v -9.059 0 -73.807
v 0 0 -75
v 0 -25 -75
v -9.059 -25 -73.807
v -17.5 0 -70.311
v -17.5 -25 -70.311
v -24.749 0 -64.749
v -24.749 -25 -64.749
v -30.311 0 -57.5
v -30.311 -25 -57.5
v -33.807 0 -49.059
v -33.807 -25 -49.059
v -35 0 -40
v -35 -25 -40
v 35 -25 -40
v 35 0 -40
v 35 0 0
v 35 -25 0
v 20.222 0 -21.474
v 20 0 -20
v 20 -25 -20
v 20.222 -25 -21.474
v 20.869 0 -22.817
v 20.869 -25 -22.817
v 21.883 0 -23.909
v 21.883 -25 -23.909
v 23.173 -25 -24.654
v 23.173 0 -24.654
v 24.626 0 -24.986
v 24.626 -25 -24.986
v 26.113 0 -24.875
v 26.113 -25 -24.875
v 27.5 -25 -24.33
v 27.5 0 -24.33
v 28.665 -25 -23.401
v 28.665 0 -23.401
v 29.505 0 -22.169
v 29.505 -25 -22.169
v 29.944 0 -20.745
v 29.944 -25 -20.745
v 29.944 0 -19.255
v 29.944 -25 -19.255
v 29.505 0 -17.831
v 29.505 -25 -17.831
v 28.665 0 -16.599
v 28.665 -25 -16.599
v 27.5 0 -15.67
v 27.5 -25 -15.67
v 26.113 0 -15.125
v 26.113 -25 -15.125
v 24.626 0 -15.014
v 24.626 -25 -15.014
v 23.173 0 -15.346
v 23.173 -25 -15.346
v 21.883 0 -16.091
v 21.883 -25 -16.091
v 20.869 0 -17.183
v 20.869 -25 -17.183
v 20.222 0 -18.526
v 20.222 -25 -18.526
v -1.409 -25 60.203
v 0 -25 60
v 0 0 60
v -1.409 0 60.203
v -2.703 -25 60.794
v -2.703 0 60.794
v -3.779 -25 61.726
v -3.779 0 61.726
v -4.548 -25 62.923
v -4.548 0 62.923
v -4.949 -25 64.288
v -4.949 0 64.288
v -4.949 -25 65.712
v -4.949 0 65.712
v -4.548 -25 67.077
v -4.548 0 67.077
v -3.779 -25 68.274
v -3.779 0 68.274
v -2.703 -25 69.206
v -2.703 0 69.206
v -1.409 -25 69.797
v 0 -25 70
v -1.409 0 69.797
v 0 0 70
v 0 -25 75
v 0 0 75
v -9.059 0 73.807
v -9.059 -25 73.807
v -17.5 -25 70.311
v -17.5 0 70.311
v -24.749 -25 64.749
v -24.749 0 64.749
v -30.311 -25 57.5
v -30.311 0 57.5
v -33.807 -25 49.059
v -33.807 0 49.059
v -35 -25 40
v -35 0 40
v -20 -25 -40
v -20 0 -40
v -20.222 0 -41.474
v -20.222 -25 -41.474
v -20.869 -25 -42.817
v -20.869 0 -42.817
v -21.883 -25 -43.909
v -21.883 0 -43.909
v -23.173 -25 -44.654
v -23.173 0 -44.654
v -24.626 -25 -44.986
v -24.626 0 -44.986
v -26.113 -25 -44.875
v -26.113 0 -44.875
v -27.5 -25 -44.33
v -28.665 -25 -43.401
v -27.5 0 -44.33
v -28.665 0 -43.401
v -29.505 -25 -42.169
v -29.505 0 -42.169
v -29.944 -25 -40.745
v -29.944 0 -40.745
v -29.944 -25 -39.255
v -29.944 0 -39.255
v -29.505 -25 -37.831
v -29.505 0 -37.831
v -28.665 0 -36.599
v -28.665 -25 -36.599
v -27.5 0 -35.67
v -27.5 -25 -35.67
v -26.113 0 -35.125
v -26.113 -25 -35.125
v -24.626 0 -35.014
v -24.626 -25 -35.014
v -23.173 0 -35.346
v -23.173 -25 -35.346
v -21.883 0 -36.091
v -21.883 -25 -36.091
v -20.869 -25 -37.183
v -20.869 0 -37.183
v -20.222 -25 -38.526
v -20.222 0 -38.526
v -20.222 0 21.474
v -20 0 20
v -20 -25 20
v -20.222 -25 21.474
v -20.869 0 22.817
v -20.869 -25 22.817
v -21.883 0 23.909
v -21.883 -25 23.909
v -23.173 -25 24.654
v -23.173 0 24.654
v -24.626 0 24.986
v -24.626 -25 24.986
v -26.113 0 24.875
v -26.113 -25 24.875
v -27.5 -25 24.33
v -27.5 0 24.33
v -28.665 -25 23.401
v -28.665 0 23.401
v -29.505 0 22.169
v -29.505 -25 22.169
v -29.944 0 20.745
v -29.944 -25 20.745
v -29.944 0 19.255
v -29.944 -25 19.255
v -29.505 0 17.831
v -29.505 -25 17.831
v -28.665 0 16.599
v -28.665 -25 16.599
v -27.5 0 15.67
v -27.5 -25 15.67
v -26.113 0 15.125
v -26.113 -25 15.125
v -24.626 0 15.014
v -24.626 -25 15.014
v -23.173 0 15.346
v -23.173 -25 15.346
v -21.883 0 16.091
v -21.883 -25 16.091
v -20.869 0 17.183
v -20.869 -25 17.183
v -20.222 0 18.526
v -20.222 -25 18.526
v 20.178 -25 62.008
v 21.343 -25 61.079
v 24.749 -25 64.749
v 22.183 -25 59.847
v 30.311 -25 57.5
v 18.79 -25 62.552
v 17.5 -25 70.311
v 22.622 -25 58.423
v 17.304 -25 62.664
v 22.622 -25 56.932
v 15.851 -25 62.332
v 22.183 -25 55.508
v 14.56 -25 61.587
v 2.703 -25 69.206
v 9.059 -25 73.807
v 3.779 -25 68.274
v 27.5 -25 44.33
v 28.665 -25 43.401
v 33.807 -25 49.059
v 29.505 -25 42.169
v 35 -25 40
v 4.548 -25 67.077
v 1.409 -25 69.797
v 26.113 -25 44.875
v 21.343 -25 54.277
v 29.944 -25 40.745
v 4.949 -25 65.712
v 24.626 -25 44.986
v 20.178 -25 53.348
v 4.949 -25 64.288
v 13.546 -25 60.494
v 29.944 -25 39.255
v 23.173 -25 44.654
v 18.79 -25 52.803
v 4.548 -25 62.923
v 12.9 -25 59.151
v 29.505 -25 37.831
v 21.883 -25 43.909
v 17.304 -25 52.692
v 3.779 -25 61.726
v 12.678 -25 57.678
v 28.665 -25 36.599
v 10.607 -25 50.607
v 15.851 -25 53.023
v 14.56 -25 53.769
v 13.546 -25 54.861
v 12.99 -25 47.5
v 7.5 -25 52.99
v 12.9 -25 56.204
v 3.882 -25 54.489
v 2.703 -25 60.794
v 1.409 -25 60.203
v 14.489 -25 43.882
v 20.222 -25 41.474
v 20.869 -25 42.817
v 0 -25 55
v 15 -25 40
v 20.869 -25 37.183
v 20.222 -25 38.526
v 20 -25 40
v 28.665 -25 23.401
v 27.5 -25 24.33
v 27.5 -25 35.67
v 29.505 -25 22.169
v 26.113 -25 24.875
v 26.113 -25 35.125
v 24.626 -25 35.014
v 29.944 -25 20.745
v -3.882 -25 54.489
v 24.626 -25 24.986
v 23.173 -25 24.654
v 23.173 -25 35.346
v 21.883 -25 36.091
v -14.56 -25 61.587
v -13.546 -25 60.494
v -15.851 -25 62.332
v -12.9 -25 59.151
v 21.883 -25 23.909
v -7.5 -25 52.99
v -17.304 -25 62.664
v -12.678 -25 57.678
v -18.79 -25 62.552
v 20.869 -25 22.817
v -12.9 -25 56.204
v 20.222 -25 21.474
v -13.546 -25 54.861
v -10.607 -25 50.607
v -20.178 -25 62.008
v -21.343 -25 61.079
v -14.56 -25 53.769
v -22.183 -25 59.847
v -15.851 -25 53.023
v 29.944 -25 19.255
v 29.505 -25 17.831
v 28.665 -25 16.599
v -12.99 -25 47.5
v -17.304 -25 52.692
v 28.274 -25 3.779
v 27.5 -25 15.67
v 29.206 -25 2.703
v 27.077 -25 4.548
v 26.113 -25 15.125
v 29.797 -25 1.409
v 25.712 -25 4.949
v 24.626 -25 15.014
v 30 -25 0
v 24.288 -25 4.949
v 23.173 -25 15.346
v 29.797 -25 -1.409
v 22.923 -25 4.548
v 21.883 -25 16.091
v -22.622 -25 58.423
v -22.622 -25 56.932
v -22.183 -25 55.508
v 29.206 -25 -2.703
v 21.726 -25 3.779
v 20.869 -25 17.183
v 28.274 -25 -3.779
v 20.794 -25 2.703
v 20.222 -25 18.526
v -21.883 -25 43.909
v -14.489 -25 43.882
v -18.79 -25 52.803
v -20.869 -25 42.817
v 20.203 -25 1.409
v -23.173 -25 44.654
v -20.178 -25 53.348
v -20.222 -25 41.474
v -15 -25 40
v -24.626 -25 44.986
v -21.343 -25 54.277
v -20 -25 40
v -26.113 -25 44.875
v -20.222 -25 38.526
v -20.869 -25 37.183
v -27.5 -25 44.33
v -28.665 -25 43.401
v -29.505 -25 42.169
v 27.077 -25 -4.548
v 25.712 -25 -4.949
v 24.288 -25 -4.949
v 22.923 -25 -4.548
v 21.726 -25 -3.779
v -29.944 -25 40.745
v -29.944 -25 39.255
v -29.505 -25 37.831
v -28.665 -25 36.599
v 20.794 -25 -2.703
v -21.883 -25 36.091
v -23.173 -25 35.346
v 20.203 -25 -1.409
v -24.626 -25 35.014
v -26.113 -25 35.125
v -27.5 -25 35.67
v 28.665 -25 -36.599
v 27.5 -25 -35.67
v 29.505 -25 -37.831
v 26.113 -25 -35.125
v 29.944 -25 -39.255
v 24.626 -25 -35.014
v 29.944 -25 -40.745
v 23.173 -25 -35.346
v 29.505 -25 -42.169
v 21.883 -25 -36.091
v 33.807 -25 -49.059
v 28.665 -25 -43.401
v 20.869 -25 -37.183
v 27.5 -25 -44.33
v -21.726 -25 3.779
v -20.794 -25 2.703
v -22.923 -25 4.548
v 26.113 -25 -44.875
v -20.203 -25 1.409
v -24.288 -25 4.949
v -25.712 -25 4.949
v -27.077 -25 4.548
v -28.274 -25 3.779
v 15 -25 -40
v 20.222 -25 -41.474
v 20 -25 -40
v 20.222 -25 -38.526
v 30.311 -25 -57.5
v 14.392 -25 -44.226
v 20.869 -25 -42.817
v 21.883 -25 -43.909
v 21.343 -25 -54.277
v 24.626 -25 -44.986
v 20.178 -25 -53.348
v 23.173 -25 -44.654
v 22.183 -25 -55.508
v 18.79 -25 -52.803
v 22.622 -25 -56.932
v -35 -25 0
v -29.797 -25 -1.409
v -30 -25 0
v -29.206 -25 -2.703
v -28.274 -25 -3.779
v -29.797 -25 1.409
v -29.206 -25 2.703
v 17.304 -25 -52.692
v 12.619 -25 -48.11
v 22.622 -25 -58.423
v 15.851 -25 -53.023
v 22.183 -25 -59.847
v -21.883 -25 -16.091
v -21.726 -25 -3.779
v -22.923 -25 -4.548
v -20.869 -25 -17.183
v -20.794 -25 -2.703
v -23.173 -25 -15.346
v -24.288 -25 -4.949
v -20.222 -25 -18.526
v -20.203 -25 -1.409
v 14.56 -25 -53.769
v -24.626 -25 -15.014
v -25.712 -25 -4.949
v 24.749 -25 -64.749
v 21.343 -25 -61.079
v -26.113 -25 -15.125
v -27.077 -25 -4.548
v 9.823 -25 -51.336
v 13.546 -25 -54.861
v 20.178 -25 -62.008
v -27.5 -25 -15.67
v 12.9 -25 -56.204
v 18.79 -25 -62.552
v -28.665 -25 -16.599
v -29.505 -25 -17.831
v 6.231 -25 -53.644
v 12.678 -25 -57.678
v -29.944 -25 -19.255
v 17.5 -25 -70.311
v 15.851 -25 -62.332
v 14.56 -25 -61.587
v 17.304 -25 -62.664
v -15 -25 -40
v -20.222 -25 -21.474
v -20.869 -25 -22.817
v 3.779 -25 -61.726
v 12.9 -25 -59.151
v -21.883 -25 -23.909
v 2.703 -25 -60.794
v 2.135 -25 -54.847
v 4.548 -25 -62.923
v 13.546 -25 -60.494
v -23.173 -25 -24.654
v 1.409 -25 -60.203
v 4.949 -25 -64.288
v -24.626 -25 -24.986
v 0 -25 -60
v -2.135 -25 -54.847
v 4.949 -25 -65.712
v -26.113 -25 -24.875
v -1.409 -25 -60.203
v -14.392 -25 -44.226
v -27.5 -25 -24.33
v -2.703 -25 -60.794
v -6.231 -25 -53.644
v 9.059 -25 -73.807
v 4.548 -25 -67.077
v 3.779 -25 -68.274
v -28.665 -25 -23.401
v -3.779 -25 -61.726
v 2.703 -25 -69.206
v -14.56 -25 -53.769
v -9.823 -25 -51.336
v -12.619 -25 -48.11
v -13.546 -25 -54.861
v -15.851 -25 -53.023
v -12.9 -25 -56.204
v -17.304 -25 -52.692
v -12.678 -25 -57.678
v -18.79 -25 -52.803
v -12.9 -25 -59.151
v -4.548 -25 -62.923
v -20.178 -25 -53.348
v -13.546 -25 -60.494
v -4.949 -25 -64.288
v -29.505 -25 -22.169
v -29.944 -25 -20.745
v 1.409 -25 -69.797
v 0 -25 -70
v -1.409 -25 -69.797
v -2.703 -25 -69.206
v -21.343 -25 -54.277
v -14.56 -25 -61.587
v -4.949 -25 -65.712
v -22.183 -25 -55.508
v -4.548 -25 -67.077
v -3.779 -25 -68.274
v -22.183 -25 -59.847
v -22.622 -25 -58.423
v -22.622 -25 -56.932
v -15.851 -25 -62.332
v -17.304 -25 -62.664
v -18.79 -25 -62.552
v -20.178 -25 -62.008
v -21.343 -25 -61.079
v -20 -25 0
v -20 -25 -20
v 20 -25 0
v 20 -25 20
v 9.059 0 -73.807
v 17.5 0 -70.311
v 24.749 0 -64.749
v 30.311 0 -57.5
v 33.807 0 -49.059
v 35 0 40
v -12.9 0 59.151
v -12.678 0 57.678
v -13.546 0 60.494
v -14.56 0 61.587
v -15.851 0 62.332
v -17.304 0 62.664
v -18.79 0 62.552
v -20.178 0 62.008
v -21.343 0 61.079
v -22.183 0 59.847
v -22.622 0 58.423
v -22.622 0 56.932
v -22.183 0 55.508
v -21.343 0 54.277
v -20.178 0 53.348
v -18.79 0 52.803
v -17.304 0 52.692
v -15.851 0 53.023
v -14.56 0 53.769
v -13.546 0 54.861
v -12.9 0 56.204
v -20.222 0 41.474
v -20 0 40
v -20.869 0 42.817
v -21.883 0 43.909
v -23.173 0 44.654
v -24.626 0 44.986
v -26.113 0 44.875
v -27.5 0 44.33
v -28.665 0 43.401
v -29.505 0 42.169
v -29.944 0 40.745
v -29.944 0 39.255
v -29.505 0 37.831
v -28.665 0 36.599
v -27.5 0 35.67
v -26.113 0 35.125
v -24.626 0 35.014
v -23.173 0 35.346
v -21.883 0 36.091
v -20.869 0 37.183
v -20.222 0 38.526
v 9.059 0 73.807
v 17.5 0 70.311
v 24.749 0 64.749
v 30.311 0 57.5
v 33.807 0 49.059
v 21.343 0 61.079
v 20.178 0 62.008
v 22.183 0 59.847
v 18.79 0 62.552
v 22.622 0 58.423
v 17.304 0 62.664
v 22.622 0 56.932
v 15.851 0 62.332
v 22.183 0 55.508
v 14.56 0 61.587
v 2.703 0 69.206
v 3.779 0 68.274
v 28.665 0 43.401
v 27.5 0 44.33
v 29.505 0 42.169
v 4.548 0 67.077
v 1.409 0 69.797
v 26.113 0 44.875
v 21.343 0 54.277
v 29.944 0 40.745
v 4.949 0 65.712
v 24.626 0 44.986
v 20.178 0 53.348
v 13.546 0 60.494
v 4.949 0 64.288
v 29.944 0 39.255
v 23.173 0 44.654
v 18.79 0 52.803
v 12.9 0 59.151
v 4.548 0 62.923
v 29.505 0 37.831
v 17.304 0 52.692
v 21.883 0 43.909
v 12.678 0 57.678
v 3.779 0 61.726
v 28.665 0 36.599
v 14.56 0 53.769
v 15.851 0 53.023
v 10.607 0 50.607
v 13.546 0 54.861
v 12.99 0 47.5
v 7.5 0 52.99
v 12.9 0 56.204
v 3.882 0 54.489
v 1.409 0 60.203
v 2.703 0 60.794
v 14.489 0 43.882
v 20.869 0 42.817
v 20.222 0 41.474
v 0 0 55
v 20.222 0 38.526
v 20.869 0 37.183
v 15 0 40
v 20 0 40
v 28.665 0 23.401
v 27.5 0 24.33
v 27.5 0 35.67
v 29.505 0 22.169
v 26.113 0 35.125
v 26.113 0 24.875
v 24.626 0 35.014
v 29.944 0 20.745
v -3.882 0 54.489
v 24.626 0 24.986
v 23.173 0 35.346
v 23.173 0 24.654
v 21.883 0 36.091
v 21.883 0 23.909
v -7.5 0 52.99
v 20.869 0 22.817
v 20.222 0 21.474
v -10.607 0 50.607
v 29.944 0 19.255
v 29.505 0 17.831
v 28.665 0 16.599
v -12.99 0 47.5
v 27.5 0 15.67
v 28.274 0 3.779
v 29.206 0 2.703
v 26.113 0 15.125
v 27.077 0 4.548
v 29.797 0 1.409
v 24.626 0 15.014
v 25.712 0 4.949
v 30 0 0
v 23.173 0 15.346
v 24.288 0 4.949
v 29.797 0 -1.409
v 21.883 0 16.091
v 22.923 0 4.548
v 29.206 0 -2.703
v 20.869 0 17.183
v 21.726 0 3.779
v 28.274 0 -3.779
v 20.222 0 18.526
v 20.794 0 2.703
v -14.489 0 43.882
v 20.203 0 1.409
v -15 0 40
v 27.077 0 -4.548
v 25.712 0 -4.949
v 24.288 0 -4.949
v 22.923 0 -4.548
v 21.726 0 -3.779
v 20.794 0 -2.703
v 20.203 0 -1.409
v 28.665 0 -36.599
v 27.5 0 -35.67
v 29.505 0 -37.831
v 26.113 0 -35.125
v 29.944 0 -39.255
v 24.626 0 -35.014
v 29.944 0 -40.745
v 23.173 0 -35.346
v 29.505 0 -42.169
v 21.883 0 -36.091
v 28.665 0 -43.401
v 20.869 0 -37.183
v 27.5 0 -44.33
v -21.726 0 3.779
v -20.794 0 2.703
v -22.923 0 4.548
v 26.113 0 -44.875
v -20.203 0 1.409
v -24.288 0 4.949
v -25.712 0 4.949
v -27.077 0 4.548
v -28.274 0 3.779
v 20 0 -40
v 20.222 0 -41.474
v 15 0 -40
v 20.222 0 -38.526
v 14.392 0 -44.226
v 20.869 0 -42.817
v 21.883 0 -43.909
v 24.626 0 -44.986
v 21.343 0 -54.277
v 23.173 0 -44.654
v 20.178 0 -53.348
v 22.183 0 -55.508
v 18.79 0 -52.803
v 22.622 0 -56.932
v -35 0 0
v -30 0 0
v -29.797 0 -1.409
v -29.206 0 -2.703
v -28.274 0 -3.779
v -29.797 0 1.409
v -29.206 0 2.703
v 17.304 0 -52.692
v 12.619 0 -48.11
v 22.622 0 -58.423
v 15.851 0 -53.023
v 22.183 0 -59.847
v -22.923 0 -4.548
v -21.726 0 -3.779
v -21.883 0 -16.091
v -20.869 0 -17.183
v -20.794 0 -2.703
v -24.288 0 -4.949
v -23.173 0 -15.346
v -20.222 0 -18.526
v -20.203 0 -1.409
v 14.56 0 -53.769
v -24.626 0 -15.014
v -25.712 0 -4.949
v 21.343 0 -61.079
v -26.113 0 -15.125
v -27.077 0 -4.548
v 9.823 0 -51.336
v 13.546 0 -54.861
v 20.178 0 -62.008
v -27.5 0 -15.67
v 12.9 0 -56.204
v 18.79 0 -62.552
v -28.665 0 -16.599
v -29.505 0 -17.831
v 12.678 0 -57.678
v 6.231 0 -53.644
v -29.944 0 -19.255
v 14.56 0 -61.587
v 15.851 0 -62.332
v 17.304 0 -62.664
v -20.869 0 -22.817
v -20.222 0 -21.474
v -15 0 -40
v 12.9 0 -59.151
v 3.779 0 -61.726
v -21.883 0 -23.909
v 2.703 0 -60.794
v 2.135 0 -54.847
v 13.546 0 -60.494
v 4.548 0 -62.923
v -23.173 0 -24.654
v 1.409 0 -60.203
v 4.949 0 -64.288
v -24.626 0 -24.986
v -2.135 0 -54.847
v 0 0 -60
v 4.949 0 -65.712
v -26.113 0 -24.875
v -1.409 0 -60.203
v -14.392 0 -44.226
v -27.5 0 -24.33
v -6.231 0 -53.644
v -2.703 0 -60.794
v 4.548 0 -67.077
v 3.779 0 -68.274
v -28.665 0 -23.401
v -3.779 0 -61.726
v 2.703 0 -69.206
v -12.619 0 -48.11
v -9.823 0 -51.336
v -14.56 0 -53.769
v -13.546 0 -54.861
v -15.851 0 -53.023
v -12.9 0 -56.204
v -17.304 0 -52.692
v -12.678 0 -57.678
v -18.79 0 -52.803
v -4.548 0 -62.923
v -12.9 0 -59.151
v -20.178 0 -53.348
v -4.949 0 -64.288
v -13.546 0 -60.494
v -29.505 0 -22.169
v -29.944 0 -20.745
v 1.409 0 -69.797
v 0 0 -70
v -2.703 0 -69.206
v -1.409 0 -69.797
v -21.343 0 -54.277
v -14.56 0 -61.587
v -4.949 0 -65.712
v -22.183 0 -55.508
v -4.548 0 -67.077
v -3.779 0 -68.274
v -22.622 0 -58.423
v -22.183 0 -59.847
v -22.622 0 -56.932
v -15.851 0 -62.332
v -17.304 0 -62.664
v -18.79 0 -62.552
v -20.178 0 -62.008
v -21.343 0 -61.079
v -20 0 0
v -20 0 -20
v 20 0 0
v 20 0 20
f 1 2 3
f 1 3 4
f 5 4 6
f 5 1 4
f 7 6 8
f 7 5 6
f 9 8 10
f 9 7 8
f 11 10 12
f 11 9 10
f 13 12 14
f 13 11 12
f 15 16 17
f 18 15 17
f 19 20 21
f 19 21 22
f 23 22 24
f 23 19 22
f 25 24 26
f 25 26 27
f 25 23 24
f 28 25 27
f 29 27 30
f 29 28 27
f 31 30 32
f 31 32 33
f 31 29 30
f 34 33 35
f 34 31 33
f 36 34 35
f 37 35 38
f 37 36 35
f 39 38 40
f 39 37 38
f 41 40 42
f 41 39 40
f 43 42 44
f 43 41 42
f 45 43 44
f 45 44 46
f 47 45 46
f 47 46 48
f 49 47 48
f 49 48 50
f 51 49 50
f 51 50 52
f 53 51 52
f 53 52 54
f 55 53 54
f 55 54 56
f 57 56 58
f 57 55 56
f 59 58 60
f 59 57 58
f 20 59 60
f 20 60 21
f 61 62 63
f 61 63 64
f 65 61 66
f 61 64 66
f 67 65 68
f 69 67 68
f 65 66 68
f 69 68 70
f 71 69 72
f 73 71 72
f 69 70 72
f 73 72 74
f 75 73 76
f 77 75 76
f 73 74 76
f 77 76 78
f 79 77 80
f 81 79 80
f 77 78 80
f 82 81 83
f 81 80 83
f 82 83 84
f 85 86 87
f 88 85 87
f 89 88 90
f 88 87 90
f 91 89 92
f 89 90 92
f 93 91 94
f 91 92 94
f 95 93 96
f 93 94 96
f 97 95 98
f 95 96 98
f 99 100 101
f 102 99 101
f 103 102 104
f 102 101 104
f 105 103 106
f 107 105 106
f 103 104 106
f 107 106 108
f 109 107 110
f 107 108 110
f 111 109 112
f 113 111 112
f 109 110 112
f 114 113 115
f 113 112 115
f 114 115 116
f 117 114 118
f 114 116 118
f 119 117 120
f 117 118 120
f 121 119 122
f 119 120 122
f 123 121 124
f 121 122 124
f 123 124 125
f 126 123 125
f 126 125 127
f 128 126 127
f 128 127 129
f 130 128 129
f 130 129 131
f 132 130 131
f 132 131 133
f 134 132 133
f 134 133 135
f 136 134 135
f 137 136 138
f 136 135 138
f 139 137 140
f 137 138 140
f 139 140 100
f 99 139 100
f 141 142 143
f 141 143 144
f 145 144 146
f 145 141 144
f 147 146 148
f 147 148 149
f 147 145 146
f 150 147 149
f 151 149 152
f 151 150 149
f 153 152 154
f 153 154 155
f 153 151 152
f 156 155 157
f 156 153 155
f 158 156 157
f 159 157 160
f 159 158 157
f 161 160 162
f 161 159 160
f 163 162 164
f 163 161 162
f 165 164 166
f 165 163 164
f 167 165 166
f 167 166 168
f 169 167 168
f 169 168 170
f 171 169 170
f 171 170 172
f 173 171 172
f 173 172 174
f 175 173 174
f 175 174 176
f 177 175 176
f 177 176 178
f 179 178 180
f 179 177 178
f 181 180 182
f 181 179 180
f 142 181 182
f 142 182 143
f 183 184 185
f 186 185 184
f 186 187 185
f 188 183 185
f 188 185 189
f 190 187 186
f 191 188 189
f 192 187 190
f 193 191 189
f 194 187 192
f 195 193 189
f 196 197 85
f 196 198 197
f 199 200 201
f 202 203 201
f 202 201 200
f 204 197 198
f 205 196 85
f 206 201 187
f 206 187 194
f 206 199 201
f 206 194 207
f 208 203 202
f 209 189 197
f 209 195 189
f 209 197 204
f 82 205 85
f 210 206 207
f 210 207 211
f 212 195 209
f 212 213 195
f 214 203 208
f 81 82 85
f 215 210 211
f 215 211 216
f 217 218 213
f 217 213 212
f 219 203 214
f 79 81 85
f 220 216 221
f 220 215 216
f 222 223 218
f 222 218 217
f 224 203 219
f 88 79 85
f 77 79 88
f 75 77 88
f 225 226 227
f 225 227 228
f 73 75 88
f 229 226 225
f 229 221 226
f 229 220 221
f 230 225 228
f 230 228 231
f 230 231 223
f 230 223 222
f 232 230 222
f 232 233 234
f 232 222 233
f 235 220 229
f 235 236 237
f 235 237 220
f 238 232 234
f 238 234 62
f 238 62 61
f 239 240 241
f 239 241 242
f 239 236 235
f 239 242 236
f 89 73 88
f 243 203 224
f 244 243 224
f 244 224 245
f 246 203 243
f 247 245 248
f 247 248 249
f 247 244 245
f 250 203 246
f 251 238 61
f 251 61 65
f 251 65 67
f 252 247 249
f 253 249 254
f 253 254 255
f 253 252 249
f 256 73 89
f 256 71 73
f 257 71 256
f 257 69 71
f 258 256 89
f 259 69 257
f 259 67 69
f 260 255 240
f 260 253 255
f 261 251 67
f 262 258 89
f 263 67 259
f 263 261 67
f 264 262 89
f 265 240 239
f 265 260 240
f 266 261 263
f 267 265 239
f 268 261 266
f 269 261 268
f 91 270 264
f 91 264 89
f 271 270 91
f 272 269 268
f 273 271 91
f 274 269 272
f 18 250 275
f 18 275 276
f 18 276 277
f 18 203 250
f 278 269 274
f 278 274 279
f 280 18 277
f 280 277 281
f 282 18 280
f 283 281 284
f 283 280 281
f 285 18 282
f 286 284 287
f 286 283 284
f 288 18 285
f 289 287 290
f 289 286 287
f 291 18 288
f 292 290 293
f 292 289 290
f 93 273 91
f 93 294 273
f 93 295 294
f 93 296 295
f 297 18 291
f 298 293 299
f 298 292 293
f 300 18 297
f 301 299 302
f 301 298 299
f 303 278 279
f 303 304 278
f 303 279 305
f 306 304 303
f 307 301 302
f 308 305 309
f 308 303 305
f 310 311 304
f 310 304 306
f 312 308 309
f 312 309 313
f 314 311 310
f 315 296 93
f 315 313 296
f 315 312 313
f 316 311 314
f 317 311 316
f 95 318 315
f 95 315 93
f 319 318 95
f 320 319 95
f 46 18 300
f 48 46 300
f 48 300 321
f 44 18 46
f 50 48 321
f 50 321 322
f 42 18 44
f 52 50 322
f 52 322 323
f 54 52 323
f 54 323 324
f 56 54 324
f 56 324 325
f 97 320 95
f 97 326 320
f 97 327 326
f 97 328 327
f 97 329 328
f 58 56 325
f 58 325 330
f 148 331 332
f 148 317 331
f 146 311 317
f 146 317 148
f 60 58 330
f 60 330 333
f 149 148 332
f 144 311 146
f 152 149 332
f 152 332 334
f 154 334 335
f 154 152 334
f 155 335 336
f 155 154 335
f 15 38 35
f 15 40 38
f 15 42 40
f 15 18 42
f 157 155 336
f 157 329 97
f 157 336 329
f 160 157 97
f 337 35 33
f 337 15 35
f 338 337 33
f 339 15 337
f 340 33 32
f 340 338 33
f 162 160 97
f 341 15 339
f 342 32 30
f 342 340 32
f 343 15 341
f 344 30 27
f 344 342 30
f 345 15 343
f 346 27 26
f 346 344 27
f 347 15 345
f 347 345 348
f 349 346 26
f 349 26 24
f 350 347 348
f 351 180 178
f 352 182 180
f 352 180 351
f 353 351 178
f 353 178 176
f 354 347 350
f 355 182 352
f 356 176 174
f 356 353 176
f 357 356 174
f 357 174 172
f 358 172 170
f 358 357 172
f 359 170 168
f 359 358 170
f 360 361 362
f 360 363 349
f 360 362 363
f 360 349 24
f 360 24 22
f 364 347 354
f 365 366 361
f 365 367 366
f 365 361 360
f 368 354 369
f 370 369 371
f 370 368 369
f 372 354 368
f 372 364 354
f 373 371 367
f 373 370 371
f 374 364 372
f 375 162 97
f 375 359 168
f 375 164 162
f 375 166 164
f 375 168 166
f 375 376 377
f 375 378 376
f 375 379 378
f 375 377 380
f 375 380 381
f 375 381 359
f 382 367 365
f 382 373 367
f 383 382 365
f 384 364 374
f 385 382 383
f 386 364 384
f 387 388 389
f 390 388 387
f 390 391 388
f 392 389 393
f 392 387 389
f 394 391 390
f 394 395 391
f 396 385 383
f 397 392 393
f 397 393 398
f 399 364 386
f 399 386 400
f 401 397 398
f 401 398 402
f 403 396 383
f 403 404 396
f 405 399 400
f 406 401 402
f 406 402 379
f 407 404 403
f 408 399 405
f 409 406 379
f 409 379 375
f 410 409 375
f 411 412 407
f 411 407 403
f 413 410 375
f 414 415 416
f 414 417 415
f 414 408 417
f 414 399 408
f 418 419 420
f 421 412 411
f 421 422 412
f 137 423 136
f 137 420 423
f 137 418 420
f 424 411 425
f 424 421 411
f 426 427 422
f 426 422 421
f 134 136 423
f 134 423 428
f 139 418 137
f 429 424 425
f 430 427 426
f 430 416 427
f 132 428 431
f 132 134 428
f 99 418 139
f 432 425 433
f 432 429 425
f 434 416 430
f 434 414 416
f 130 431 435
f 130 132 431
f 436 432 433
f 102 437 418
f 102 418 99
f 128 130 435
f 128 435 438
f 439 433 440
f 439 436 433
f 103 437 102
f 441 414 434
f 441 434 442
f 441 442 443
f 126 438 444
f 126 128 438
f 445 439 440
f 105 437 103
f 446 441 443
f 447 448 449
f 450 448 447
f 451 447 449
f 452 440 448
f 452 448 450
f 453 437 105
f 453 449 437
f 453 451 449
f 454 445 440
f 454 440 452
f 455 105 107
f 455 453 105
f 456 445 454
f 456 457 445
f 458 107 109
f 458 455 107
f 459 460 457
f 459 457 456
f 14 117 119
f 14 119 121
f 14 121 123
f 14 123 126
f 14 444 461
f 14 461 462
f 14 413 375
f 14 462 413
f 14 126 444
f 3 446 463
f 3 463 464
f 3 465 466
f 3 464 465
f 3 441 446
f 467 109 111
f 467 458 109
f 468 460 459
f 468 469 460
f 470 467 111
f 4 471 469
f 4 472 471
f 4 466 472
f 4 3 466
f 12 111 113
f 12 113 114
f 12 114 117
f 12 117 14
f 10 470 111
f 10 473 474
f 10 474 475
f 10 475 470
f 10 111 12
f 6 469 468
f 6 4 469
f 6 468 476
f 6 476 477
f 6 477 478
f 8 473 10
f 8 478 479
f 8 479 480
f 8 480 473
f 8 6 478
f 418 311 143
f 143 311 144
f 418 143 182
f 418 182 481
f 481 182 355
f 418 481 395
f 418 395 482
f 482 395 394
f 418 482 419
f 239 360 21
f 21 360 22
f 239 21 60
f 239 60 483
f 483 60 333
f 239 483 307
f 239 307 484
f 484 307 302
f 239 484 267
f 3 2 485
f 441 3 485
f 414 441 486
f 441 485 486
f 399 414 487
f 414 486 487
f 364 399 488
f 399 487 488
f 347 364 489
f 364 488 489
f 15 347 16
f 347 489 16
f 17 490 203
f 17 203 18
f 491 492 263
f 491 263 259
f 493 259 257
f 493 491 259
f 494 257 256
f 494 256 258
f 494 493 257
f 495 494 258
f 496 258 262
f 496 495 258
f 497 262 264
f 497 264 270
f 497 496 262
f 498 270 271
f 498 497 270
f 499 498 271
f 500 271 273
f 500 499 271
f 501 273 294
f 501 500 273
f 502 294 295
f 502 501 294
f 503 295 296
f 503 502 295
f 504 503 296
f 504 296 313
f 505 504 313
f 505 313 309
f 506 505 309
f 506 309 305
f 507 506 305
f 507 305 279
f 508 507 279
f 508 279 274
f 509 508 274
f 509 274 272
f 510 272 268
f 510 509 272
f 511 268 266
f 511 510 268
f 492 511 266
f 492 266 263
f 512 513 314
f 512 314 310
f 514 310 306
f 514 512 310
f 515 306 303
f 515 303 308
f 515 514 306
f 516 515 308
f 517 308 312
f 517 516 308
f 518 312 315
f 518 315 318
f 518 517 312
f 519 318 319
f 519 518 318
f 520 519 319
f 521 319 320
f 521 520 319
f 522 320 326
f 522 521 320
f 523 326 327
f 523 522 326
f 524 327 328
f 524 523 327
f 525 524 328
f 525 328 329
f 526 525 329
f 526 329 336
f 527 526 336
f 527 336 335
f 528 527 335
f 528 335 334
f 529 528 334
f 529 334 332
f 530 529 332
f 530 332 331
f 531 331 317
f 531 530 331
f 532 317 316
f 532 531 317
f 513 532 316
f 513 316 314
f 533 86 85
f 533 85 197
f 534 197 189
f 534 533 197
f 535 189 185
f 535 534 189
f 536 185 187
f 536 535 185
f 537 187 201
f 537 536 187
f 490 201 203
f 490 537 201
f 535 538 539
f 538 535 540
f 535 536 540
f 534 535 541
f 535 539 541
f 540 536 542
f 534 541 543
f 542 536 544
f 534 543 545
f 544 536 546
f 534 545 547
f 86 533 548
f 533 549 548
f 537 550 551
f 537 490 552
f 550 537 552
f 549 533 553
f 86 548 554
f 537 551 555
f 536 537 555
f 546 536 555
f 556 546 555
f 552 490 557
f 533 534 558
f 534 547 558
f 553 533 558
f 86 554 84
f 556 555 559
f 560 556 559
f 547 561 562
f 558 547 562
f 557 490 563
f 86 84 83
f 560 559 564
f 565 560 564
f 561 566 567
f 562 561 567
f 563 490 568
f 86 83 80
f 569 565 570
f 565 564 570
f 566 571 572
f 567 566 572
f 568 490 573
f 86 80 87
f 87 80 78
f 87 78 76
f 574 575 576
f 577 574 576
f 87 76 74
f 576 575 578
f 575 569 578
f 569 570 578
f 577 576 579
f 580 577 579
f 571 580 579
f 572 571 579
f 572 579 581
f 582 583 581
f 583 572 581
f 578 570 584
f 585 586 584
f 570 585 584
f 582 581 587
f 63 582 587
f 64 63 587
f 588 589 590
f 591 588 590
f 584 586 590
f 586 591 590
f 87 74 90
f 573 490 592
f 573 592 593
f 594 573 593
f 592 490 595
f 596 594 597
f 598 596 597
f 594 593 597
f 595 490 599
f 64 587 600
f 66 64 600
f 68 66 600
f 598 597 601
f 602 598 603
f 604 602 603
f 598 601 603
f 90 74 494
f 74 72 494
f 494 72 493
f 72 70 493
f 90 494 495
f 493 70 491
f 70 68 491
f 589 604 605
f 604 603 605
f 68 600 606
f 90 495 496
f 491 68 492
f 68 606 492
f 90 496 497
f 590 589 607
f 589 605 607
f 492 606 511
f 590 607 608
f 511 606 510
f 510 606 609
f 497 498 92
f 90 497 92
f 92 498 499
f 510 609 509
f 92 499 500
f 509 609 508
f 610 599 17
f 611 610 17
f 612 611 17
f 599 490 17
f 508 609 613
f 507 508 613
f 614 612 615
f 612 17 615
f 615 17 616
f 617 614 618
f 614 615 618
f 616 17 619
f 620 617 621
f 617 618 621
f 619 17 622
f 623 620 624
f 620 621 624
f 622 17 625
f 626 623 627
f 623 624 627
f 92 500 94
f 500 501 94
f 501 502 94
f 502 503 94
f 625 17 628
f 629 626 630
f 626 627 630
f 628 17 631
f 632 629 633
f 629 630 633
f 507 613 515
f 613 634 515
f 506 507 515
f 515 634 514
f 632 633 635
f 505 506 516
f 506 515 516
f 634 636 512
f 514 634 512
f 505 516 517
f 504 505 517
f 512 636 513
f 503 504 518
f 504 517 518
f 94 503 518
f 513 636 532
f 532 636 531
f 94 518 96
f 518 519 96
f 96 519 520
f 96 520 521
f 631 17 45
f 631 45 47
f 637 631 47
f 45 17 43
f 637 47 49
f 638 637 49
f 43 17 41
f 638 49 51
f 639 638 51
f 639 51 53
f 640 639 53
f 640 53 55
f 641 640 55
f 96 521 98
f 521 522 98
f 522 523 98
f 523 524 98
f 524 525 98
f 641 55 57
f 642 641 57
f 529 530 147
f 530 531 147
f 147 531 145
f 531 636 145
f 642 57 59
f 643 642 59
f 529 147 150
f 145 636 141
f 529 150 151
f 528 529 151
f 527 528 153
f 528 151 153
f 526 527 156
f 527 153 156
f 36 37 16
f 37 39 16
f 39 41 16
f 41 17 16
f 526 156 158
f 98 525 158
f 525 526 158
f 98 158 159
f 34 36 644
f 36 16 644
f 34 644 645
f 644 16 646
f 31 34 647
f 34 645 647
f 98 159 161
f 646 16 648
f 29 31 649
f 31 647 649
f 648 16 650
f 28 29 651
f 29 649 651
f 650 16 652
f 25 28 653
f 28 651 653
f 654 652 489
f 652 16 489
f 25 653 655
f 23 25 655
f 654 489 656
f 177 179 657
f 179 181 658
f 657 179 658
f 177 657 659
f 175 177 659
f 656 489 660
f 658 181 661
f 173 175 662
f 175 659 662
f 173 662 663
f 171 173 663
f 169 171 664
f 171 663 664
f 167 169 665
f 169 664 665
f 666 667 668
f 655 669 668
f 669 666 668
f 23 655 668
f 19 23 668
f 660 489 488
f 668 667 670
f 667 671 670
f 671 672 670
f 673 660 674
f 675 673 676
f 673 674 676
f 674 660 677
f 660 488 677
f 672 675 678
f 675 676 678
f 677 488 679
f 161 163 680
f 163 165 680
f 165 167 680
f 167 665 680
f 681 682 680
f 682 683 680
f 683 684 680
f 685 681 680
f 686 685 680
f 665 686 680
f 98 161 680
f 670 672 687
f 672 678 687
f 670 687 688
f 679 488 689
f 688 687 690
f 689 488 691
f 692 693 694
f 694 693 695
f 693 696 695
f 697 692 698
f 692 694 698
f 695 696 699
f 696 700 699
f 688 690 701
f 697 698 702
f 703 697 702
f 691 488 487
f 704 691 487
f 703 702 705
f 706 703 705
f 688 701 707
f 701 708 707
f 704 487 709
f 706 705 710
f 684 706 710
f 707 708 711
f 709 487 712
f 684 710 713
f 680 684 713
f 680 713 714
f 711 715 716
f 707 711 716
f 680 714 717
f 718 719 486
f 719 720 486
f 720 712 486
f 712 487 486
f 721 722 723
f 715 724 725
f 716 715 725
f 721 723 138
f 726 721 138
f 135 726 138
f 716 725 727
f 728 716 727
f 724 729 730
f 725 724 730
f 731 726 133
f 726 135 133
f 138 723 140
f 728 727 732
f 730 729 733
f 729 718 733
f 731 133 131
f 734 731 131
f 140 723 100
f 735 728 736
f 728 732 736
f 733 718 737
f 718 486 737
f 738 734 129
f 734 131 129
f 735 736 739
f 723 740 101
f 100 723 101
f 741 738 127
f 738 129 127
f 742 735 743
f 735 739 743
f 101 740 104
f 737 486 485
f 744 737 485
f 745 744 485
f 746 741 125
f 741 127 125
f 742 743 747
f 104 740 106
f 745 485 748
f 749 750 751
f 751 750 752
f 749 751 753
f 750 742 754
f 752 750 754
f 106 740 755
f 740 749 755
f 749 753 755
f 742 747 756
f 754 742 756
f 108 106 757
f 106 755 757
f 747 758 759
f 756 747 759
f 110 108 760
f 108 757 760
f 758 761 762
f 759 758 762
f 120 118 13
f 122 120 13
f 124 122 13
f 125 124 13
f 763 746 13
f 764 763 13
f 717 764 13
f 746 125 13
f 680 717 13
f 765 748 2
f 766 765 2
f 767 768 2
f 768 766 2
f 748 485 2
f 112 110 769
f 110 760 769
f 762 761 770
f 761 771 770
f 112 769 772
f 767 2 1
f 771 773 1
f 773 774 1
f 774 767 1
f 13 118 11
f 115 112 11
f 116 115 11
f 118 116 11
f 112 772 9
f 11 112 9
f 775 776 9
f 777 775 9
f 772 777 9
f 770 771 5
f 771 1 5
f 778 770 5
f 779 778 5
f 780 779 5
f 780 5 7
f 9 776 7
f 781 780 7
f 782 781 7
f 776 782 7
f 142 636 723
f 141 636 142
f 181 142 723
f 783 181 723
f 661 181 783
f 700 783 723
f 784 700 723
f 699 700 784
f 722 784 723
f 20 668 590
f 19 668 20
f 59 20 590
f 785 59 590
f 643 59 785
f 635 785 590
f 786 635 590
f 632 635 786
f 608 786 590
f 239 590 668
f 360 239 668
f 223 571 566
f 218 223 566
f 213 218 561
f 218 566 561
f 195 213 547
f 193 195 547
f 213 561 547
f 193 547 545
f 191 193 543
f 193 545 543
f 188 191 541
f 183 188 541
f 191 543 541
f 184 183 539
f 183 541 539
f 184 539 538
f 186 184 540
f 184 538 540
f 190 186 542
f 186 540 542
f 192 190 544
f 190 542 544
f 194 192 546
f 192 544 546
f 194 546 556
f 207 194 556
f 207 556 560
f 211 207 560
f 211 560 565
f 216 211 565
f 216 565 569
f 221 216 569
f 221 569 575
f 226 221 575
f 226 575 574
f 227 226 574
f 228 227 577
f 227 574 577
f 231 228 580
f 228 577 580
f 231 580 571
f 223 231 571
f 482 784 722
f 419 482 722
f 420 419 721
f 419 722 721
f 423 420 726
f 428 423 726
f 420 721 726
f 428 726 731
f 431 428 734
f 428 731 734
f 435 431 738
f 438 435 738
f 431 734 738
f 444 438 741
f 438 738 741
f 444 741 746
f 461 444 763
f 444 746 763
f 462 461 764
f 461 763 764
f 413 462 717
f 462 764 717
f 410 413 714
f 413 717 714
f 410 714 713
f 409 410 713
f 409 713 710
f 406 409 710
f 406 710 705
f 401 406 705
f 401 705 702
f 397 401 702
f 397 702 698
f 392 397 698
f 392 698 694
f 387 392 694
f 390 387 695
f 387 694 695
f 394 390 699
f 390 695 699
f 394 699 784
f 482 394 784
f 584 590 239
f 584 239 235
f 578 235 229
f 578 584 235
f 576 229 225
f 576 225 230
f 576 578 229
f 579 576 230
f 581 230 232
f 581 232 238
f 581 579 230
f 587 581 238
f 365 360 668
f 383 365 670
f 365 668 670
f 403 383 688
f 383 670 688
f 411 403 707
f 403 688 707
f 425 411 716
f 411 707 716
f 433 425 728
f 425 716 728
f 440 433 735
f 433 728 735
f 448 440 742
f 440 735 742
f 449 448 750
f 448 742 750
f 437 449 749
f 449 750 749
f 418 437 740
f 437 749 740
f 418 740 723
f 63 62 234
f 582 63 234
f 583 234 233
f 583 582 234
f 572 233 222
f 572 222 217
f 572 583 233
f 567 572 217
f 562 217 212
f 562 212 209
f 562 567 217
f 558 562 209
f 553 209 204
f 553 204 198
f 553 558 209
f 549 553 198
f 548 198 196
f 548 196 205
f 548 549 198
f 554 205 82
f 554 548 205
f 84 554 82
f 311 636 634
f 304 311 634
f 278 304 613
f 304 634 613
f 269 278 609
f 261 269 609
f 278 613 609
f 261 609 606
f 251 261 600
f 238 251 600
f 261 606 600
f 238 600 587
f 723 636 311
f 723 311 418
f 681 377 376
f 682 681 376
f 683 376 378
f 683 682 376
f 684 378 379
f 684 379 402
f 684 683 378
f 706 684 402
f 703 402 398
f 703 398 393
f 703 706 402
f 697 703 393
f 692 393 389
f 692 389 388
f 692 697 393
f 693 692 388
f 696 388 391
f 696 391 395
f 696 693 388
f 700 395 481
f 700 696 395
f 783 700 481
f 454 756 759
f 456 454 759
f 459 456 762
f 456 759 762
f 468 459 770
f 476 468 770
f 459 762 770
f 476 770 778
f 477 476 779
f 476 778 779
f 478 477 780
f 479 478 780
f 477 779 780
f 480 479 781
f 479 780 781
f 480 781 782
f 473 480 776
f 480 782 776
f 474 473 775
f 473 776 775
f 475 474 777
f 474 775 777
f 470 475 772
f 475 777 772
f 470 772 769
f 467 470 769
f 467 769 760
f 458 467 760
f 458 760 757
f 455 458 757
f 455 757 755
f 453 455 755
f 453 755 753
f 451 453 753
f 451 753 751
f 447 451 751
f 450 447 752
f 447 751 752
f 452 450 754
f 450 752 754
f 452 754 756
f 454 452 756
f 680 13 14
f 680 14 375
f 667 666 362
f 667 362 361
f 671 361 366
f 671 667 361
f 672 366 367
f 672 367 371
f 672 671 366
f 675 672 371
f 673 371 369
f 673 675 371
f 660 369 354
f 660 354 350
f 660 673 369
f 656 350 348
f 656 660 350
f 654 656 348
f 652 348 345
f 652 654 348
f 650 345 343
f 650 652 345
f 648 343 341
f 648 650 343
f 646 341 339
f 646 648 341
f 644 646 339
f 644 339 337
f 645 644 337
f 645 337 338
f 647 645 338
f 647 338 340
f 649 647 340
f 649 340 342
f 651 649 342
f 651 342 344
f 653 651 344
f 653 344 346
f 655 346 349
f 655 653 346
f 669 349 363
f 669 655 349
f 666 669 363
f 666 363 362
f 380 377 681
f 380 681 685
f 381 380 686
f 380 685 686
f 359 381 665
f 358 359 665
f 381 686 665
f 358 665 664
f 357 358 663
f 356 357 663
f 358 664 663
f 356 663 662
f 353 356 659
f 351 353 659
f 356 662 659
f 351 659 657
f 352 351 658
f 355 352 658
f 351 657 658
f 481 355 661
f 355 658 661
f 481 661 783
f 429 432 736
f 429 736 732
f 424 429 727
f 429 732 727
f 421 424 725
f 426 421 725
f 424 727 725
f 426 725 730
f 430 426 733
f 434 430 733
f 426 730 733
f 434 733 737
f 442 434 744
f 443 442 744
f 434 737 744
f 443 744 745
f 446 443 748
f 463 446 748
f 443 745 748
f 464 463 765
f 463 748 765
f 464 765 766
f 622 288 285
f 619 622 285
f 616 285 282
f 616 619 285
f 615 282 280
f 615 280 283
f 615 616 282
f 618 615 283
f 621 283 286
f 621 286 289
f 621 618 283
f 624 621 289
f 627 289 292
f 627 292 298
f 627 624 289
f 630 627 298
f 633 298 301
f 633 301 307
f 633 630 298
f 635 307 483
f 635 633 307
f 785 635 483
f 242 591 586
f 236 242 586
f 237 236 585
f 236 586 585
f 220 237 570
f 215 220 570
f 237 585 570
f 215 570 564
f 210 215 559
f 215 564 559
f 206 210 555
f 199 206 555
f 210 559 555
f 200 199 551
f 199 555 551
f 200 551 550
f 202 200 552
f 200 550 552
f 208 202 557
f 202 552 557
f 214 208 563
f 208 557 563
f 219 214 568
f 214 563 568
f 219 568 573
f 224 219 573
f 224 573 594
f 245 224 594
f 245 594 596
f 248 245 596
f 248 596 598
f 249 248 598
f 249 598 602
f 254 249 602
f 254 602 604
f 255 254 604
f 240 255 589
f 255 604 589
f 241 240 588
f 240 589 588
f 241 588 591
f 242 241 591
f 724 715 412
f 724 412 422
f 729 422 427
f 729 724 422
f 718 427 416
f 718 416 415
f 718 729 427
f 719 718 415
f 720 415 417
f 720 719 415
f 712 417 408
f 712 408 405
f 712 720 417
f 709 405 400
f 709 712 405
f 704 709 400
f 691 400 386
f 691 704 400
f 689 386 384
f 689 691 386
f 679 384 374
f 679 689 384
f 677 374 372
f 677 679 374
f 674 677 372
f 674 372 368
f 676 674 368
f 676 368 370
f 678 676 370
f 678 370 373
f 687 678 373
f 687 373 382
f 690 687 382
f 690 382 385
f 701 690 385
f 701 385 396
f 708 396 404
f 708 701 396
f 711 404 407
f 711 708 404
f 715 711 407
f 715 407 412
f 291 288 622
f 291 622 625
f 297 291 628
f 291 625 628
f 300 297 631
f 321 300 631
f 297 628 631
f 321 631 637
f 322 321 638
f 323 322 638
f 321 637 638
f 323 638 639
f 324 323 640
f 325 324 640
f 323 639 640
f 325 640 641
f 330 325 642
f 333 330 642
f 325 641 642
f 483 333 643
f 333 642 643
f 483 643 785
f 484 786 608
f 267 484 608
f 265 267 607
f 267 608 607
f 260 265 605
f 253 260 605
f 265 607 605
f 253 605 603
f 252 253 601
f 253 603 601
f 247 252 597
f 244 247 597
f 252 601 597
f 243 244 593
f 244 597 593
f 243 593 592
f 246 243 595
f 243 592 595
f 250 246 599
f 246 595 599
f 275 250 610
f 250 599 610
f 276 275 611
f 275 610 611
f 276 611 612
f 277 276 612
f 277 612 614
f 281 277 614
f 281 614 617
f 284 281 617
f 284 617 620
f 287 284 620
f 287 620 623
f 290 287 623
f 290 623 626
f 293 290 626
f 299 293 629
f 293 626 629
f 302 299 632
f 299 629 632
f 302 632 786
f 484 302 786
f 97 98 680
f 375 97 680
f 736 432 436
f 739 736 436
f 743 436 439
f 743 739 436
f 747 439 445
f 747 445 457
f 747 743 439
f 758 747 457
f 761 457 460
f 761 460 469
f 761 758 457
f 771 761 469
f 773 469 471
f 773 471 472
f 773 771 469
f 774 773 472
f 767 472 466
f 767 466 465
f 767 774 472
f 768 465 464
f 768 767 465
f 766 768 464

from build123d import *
from build123d import SkipClean  # not in build123d's __all__

# Parameters (mm, degrees)
F0_R     = 5
F1_DEPTH = 25


with BuildPart() as f1:
    # F0 (on Front) → F1 (new body)
    with BuildSketch(Plane.XZ):
        with BuildLine():
            ThreePointArc((-15, 40), (-10.6066017178, 50.6066017178), (0, 55))
            Line((0, 55), (0, 60))
            ThreePointArc((0, 60), (-5, 65), (0, 70))
            Line((0, 70), (0, 75))
            ThreePointArc((0, 75), (-24.7487373415, 64.7487373415), (-35, 40))
            Line((-35, 40), (-35, 0))
            Line((-35, 0), (-30, 0))
            ThreePointArc((-30, 0), (-25, 5), (-20, 0))
            Line((-20, 0), (-15, 0))
            Line((-15, 0), (-15, 40))
        make_face()
        with Locations((-25, 20)):
            Circle(F0_R, mode=Mode.SUBTRACT)
        with Locations((-25, 40)):
            Circle(F0_R, mode=Mode.SUBTRACT)
        with Locations((-17.6776695297, 57.6776695297)):
            Circle(F0_R, mode=Mode.SUBTRACT)
    extrude(amount=F1_DEPTH)

    # F2: F1 across plane


with BuildPart() as f1_1:
    add(f1.part, clean=False)
    with SkipClean():  # cleaning this boolean's faces spoils the solid; the shape is the same uncleaned
        add(f1.part.mirror(Plane.YZ), clean=False)

    # F3: F1 across plane


with BuildPart() as f1_2:
    add(f1_1.part, clean=False)
    add(f1_1.part.mirror(Plane.XY), clean=False)


solid = f1_2.part
